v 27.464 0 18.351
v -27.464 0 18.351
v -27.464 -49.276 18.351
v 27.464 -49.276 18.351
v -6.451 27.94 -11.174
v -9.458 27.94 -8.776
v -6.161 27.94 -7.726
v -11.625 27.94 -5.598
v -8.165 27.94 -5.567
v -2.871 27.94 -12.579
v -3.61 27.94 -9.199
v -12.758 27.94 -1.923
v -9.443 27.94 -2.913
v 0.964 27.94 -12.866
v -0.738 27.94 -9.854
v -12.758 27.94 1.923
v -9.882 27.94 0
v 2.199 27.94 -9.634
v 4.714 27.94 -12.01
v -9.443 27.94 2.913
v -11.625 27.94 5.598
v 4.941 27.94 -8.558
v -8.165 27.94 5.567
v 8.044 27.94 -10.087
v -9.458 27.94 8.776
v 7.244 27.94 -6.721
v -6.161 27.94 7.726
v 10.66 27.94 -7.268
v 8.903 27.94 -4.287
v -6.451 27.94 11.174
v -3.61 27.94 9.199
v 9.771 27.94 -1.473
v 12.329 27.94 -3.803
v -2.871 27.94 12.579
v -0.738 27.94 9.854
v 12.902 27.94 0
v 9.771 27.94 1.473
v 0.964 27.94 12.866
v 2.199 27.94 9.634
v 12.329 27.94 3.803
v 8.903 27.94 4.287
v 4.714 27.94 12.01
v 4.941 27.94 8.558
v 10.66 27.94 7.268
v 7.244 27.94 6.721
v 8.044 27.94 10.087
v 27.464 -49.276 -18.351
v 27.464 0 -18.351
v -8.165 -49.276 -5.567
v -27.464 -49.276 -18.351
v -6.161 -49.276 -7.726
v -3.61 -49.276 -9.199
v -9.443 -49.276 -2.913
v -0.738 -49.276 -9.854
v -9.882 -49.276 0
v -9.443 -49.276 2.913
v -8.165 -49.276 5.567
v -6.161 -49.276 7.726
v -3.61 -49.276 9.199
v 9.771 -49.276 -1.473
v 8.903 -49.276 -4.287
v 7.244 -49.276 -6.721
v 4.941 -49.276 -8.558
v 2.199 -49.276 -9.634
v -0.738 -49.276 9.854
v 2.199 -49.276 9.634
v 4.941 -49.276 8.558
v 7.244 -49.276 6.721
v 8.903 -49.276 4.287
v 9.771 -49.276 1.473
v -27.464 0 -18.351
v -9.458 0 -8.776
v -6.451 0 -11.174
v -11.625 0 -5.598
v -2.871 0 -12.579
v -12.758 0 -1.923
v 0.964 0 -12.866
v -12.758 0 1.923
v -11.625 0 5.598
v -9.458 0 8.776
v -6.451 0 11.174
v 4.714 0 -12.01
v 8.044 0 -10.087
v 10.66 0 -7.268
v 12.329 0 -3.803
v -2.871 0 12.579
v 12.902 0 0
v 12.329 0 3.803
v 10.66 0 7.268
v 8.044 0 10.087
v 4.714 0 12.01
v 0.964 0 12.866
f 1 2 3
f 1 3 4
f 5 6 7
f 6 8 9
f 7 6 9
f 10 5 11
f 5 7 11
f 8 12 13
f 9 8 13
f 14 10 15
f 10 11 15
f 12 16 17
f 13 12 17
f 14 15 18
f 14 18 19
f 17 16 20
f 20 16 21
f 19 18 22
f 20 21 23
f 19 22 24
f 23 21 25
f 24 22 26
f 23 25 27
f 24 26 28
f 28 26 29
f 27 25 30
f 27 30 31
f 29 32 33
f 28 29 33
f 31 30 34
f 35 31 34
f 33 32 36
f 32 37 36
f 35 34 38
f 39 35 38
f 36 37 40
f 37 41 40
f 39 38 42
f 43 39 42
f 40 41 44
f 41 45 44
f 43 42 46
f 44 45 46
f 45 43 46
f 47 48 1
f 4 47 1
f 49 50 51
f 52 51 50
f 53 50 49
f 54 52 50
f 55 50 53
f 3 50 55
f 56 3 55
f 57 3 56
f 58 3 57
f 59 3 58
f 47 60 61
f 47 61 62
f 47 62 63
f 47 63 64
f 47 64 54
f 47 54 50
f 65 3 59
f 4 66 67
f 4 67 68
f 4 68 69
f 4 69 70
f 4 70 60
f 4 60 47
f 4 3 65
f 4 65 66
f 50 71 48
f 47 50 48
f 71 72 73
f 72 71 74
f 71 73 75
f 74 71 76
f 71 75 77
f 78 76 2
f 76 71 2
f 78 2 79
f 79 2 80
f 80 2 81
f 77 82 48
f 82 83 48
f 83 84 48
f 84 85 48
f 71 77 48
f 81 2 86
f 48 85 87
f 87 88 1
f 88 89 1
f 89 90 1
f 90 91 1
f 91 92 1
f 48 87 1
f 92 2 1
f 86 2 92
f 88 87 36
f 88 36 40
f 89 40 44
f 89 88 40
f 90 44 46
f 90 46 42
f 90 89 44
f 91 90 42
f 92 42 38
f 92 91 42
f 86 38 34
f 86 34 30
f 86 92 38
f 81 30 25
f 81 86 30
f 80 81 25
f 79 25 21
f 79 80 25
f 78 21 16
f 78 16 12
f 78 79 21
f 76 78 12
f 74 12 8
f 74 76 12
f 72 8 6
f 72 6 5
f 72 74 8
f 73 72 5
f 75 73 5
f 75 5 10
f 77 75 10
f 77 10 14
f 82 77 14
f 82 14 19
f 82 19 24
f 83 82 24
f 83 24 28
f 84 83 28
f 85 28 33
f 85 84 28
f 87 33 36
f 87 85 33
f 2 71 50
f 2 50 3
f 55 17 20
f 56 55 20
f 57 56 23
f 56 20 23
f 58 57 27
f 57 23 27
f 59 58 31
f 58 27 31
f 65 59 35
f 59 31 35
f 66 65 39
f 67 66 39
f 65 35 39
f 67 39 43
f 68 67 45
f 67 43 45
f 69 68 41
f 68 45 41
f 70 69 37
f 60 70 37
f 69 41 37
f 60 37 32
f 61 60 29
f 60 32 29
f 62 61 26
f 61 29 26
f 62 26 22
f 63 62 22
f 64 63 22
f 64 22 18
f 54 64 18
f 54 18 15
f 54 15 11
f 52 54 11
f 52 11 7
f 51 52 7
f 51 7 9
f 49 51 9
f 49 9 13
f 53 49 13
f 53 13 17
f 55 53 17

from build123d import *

# Parameters (mm, degrees)
F0_W     = 54.92849
F0_H     = 36.702846
F1_DEPTH = 49.276
F2_R     = 12.902287
F3_DEPTH = 27.94
F4_R     = 9.88166
F5_DEPTH = 92.202


with BuildPart() as f1:
    # F0 (on Front) → F1 (new body)
    with BuildSketch(Plane.XZ):
        Rectangle(F0_W, F0_H)
    extrude(amount=F1_DEPTH)

    # F2 (on Front) → F3 (join)
    with BuildSketch(Plane.XZ):
        Circle(F2_R)
    extrude(amount=-F3_DEPTH)

    # F4 (on face) → F5 (cut)
    with BuildSketch(Plane(origin=(0, 27.94, 0), x_dir=(-1, 0, 0), z_dir=(0, 1, 0))):
        Circle(F4_R)
    extrude(amount=-F5_DEPTH, mode=Mode.SUBTRACT)


solid = f1.part
